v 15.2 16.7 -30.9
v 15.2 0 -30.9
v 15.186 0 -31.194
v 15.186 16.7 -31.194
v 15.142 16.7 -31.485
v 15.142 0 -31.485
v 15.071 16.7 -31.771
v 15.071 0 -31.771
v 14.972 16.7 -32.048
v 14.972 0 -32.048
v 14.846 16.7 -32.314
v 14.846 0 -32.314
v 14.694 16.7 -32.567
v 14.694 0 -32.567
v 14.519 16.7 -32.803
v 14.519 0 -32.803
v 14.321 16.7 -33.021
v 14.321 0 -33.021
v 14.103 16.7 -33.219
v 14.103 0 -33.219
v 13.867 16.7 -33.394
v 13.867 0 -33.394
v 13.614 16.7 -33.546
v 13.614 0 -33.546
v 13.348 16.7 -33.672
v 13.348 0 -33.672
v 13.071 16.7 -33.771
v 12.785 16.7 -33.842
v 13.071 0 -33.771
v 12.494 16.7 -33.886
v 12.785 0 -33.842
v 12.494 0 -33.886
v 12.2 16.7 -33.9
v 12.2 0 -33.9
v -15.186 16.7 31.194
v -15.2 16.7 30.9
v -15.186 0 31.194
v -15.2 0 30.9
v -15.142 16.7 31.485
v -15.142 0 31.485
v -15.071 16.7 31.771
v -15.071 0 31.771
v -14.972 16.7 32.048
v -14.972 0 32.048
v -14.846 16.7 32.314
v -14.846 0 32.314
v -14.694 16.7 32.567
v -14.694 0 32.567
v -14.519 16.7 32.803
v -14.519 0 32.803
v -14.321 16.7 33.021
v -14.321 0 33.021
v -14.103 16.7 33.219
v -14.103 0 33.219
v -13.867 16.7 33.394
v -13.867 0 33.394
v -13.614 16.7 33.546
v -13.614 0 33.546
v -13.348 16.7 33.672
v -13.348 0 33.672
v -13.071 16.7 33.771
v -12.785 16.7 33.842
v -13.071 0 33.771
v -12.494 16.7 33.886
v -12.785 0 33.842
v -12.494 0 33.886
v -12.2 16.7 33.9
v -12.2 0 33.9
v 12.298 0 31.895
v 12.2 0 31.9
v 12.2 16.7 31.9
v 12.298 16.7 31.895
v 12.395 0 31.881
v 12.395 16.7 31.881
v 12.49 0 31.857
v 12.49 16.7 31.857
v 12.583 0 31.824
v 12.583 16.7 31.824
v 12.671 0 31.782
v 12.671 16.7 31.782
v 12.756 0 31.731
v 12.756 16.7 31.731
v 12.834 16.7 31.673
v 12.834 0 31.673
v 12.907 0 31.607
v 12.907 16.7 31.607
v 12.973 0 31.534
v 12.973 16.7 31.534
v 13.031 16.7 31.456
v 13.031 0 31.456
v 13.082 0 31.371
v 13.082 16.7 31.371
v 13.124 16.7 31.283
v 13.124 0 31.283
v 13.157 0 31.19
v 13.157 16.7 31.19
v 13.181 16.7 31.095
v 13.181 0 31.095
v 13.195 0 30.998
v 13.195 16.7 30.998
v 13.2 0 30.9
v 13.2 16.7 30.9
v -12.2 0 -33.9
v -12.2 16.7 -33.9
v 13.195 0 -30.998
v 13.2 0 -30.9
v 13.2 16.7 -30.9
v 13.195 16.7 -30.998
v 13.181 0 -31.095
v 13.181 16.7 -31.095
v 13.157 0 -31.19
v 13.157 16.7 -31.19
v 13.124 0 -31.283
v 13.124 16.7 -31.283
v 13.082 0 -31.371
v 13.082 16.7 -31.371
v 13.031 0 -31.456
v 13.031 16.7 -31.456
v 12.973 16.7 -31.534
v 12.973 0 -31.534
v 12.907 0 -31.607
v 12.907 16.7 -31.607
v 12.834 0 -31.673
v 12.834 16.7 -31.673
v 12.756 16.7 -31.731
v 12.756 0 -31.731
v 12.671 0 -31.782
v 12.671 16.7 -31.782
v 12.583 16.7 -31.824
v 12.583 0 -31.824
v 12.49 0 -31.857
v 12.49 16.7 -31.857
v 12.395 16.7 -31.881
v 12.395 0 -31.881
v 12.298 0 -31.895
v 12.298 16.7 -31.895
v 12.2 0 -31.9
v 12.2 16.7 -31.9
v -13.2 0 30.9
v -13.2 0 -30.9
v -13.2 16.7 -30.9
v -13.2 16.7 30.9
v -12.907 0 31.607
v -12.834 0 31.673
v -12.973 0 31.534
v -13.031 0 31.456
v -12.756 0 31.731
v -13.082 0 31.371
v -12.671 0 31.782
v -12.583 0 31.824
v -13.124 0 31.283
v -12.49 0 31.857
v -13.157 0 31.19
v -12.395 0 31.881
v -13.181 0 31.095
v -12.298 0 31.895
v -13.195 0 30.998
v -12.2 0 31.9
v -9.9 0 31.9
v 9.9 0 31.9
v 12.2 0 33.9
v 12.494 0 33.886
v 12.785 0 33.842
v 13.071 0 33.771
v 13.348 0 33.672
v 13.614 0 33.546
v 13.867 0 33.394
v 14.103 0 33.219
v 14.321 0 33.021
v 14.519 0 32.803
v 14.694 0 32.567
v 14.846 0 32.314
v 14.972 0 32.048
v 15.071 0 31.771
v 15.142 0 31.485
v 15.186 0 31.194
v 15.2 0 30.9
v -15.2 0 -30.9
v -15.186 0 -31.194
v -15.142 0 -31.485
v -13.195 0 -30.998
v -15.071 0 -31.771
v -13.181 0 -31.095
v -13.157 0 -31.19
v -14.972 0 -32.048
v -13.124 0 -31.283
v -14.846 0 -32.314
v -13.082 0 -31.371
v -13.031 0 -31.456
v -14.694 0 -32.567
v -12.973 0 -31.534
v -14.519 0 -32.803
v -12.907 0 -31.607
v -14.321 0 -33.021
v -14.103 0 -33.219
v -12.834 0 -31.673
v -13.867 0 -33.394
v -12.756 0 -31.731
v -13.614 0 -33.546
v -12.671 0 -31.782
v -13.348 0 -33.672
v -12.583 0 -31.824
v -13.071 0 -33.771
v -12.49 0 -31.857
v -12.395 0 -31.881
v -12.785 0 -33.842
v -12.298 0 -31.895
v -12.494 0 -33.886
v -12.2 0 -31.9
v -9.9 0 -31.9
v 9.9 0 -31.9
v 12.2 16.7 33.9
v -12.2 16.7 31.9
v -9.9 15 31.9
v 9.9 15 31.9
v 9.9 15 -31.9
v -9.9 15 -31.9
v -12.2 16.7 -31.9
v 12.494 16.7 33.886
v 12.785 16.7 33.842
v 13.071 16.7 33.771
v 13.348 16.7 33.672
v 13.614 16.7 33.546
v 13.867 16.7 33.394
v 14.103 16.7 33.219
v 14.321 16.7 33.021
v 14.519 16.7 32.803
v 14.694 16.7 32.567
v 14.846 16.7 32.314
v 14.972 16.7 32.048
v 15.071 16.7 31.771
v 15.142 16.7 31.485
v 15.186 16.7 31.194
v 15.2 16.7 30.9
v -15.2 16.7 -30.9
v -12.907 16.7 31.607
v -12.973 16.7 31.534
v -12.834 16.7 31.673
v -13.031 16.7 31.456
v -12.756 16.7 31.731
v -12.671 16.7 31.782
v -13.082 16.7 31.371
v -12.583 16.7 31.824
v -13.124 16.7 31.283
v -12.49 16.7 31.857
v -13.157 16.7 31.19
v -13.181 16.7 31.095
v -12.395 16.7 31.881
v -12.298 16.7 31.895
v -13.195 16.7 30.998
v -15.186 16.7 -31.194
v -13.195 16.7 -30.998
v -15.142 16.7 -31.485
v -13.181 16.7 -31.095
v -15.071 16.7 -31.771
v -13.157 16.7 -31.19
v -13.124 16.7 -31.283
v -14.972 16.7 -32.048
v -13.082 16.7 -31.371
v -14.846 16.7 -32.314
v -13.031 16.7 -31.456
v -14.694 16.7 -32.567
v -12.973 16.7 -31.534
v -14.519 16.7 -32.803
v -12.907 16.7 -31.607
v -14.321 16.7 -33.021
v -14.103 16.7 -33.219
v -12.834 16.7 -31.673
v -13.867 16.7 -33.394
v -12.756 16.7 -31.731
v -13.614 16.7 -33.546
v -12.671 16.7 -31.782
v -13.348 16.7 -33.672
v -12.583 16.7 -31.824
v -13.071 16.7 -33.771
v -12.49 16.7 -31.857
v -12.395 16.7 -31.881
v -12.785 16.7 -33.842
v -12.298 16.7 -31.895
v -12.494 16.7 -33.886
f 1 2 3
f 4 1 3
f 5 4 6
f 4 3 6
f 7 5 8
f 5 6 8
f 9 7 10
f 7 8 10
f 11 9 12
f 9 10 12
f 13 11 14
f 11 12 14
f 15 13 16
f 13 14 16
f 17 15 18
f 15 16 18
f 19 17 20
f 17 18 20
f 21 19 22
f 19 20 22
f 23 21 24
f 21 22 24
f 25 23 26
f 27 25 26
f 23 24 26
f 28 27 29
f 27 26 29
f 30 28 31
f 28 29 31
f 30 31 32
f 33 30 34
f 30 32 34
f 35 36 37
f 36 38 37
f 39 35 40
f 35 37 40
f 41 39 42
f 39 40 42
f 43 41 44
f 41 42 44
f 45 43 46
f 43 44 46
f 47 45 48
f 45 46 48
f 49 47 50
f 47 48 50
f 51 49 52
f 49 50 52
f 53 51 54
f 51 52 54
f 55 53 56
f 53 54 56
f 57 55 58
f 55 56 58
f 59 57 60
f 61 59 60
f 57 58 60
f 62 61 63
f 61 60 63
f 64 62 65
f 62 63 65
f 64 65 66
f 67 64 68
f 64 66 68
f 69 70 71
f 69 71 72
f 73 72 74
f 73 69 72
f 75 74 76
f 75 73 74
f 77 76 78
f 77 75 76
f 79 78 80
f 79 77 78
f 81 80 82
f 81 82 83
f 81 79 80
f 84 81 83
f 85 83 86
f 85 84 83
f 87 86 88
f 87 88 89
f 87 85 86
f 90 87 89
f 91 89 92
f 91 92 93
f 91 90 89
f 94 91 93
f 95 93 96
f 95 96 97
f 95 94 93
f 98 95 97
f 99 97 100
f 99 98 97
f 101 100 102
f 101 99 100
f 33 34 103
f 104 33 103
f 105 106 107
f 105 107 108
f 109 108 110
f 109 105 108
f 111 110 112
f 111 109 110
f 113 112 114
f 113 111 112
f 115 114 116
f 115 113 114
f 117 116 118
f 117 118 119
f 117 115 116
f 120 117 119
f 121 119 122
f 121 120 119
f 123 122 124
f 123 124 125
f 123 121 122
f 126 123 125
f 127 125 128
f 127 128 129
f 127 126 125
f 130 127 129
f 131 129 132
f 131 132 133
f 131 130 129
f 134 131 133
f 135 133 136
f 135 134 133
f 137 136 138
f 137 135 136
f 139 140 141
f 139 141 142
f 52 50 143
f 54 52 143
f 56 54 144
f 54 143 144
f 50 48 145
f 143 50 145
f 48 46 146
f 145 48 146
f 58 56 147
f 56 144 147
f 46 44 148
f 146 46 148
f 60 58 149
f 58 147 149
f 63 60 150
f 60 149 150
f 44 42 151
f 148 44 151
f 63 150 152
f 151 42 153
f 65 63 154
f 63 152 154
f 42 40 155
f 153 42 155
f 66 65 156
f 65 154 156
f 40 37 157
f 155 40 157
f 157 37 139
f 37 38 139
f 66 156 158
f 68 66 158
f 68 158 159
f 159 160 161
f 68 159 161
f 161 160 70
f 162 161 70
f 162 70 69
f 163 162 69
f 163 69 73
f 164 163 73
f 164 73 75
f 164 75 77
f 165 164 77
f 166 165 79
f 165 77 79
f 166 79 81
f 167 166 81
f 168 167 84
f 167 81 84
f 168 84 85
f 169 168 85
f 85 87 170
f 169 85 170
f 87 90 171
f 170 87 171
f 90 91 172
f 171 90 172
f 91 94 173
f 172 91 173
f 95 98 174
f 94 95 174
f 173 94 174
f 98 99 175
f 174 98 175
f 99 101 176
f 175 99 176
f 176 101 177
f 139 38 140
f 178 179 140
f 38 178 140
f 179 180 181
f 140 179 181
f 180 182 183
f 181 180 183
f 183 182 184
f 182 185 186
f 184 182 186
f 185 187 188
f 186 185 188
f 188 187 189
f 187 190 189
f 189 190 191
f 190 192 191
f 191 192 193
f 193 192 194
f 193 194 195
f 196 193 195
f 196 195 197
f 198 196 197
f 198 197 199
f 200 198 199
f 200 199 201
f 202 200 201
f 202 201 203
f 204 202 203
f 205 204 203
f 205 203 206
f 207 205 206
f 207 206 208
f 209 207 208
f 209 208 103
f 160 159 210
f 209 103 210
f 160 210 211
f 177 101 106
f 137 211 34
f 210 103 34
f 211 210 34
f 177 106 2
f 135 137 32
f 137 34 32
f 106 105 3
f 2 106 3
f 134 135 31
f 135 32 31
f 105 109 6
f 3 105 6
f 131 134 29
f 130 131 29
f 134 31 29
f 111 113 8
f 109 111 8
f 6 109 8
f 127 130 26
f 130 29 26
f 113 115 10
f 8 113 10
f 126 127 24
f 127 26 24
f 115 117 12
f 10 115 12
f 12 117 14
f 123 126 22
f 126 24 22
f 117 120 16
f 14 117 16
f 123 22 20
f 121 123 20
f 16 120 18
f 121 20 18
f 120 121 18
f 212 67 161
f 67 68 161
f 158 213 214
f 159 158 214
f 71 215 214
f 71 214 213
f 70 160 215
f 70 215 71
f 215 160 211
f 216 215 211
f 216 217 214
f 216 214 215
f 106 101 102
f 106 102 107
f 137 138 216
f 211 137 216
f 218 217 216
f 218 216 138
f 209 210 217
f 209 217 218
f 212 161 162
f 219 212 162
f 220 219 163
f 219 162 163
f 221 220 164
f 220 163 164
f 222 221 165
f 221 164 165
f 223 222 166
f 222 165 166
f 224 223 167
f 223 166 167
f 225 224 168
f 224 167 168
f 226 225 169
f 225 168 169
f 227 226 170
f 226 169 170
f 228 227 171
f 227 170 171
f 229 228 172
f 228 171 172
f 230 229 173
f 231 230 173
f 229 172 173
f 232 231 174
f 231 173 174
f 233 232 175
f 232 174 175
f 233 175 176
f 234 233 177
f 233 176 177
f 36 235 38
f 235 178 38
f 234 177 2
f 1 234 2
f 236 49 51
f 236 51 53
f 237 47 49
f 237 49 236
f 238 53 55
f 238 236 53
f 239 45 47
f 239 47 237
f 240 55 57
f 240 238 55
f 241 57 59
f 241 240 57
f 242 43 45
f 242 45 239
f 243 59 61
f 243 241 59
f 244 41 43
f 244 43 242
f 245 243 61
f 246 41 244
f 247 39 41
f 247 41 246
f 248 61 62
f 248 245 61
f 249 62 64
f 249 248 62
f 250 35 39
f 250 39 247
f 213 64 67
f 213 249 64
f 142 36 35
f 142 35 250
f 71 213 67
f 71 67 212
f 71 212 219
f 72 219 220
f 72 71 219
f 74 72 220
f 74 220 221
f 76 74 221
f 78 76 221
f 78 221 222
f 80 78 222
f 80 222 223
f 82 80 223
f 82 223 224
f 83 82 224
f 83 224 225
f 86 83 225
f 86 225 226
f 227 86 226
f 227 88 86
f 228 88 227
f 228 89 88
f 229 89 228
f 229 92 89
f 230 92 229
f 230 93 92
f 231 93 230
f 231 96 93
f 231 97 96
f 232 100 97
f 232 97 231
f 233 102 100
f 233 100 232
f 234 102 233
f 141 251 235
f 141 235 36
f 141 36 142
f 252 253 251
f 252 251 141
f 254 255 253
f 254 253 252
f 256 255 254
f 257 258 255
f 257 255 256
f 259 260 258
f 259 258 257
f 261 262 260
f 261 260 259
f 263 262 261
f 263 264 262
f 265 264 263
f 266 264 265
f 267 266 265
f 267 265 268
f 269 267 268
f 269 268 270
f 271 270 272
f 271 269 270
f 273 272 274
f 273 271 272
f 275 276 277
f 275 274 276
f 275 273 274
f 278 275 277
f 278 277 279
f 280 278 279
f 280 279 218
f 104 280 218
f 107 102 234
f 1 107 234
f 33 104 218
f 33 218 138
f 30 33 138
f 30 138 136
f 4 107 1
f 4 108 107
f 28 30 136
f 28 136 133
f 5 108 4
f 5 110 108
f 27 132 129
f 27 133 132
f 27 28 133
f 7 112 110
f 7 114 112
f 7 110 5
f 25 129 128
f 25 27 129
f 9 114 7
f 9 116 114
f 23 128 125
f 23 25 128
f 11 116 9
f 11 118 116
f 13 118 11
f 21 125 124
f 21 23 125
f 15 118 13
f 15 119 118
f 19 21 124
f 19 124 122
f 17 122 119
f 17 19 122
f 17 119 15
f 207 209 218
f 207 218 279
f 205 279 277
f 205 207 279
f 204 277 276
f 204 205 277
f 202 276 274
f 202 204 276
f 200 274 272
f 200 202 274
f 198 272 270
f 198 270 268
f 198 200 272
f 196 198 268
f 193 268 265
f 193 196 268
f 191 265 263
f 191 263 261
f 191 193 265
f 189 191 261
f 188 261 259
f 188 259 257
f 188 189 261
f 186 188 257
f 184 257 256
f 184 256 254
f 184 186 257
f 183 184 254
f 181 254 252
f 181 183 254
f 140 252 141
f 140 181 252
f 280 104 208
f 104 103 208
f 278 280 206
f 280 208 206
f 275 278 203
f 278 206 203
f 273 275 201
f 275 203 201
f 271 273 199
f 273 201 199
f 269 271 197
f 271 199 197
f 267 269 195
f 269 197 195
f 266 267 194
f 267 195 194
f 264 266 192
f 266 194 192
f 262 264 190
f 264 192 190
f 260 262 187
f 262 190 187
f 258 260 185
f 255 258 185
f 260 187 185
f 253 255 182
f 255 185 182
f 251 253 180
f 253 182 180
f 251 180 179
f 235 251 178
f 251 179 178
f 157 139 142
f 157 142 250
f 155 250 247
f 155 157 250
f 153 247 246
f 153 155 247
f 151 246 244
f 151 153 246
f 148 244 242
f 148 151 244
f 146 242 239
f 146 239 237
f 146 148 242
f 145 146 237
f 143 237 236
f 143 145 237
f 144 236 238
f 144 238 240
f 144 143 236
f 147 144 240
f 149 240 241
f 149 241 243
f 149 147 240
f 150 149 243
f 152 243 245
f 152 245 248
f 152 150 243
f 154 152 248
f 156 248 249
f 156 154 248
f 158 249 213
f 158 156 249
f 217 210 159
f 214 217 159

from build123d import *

# Parameters (mm, degrees)
BOSS_EXTRUDE1_DEPTH = 15
BOSS_EXTRUDE2_DEPTH = 1.7


with BuildPart() as part:
    # Sketch1 → Boss-Extrude1 (new body)
    with BuildSketch(Plane(origin=(0, 0, 0), x_dir=(1, 0, 0), z_dir=(0, 1, 0))):
        with BuildLine():
            ThreePointArc((-12.2, 33.9), (-14.321320344, 33.021320344), (-15.2, 30.9))
            Line((-15.2, 30.9), (-15.2, -30.9))
            ThreePointArc((-15.2, -30.9), (-14.321320344, -33.021320344), (-12.2, -33.9))
            Line((-12.2, -33.9), (12.2, -33.9))
            ThreePointArc((12.2, -33.9), (14.321320344, -33.021320344), (15.2, -30.9))
            Line((15.2, -30.9), (15.2, 30.9))
            ThreePointArc((15.2, 30.9), (14.321320344, 33.021320344), (12.2, 33.9))
            Line((12.2, 33.9), (-12.2, 33.9))
        make_face()
        with BuildLine():
            Line((-12.2, 31.9), (-9.9, 31.9))
            Line((-9.9, 31.9), (-9.9, -31.9))
            Line((-9.9, -31.9), (-12.2, -31.9))
            ThreePointArc((-12.2, -31.9), (-12.907106781, -31.607106781), (-13.2, -30.9))
            Line((-13.2, -30.9), (-13.2, 30.9))
            ThreePointArc((-13.2, 30.9), (-12.907106781, 31.607106781), (-12.2, 31.9))
        make_face(mode=Mode.SUBTRACT)
        with BuildLine():
            Line((12.2, -31.9), (9.9, -31.9))
            Line((9.9, -31.9), (9.9, 31.9))
            Line((9.9, 31.9), (12.2, 31.9))
            ThreePointArc((12.2, 31.9), (12.907106781, 31.607106781), (13.2, 30.9))
            Line((13.2, 30.9), (13.2, -30.9))
            ThreePointArc((13.2, -30.9), (12.907106781, -31.607106781), (12.2, -31.9))
        make_face(mode=Mode.SUBTRACT)
    extrude(amount=BOSS_EXTRUDE1_DEPTH)

    # Sketch2 → Boss-Extrude2 (add)
    with BuildSketch(Plane(origin=(0, 15, 0), x_dir=(1, 0, 0), z_dir=(0, 1, 0))):
        with BuildLine():
            Line((12.2, 33.9), (-12.2, 33.9))
            ThreePointArc((-12.2, 33.9), (-14.321320344, 33.021320344), (-15.2, 30.9))
            Line((-15.2, 30.9), (-15.2, -30.9))
            ThreePointArc((-15.2, -30.9), (-14.321320344, -33.021320344), (-12.2, -33.9))
            Line((-12.2, -33.9), (12.2, -33.9))
            ThreePointArc((12.2, -33.9), (14.321320344, -33.021320344), (15.2, -30.9))
            Line((15.2, -30.9), (15.2, 30.9))
            ThreePointArc((15.2, 30.9), (14.321320344, 33.021320344), (12.2, 33.9))
        make_face()
        with BuildLine():
            Line((12.2, 31.9), (-12.2, 31.9))
            ThreePointArc((-12.2, 31.9), (-12.907106781, 31.607106781), (-13.2, 30.9))
            Line((-13.2, 30.9), (-13.2, -30.9))
            ThreePointArc((-13.2, -30.9), (-12.907106781, -31.607106781), (-12.2, -31.9))
            Line((-12.2, -31.9), (12.2, -31.9))
            ThreePointArc((12.2, -31.9), (12.907106781, -31.607106781), (13.2, -30.9))
            Line((13.2, -30.9), (13.2, 30.9))
            ThreePointArc((13.2, 30.9), (12.907106781, 31.607106781), (12.2, 31.9))
        make_face(mode=Mode.SUBTRACT)
    extrude(amount=BOSS_EXTRUDE2_DEPTH)


solid = part.part
